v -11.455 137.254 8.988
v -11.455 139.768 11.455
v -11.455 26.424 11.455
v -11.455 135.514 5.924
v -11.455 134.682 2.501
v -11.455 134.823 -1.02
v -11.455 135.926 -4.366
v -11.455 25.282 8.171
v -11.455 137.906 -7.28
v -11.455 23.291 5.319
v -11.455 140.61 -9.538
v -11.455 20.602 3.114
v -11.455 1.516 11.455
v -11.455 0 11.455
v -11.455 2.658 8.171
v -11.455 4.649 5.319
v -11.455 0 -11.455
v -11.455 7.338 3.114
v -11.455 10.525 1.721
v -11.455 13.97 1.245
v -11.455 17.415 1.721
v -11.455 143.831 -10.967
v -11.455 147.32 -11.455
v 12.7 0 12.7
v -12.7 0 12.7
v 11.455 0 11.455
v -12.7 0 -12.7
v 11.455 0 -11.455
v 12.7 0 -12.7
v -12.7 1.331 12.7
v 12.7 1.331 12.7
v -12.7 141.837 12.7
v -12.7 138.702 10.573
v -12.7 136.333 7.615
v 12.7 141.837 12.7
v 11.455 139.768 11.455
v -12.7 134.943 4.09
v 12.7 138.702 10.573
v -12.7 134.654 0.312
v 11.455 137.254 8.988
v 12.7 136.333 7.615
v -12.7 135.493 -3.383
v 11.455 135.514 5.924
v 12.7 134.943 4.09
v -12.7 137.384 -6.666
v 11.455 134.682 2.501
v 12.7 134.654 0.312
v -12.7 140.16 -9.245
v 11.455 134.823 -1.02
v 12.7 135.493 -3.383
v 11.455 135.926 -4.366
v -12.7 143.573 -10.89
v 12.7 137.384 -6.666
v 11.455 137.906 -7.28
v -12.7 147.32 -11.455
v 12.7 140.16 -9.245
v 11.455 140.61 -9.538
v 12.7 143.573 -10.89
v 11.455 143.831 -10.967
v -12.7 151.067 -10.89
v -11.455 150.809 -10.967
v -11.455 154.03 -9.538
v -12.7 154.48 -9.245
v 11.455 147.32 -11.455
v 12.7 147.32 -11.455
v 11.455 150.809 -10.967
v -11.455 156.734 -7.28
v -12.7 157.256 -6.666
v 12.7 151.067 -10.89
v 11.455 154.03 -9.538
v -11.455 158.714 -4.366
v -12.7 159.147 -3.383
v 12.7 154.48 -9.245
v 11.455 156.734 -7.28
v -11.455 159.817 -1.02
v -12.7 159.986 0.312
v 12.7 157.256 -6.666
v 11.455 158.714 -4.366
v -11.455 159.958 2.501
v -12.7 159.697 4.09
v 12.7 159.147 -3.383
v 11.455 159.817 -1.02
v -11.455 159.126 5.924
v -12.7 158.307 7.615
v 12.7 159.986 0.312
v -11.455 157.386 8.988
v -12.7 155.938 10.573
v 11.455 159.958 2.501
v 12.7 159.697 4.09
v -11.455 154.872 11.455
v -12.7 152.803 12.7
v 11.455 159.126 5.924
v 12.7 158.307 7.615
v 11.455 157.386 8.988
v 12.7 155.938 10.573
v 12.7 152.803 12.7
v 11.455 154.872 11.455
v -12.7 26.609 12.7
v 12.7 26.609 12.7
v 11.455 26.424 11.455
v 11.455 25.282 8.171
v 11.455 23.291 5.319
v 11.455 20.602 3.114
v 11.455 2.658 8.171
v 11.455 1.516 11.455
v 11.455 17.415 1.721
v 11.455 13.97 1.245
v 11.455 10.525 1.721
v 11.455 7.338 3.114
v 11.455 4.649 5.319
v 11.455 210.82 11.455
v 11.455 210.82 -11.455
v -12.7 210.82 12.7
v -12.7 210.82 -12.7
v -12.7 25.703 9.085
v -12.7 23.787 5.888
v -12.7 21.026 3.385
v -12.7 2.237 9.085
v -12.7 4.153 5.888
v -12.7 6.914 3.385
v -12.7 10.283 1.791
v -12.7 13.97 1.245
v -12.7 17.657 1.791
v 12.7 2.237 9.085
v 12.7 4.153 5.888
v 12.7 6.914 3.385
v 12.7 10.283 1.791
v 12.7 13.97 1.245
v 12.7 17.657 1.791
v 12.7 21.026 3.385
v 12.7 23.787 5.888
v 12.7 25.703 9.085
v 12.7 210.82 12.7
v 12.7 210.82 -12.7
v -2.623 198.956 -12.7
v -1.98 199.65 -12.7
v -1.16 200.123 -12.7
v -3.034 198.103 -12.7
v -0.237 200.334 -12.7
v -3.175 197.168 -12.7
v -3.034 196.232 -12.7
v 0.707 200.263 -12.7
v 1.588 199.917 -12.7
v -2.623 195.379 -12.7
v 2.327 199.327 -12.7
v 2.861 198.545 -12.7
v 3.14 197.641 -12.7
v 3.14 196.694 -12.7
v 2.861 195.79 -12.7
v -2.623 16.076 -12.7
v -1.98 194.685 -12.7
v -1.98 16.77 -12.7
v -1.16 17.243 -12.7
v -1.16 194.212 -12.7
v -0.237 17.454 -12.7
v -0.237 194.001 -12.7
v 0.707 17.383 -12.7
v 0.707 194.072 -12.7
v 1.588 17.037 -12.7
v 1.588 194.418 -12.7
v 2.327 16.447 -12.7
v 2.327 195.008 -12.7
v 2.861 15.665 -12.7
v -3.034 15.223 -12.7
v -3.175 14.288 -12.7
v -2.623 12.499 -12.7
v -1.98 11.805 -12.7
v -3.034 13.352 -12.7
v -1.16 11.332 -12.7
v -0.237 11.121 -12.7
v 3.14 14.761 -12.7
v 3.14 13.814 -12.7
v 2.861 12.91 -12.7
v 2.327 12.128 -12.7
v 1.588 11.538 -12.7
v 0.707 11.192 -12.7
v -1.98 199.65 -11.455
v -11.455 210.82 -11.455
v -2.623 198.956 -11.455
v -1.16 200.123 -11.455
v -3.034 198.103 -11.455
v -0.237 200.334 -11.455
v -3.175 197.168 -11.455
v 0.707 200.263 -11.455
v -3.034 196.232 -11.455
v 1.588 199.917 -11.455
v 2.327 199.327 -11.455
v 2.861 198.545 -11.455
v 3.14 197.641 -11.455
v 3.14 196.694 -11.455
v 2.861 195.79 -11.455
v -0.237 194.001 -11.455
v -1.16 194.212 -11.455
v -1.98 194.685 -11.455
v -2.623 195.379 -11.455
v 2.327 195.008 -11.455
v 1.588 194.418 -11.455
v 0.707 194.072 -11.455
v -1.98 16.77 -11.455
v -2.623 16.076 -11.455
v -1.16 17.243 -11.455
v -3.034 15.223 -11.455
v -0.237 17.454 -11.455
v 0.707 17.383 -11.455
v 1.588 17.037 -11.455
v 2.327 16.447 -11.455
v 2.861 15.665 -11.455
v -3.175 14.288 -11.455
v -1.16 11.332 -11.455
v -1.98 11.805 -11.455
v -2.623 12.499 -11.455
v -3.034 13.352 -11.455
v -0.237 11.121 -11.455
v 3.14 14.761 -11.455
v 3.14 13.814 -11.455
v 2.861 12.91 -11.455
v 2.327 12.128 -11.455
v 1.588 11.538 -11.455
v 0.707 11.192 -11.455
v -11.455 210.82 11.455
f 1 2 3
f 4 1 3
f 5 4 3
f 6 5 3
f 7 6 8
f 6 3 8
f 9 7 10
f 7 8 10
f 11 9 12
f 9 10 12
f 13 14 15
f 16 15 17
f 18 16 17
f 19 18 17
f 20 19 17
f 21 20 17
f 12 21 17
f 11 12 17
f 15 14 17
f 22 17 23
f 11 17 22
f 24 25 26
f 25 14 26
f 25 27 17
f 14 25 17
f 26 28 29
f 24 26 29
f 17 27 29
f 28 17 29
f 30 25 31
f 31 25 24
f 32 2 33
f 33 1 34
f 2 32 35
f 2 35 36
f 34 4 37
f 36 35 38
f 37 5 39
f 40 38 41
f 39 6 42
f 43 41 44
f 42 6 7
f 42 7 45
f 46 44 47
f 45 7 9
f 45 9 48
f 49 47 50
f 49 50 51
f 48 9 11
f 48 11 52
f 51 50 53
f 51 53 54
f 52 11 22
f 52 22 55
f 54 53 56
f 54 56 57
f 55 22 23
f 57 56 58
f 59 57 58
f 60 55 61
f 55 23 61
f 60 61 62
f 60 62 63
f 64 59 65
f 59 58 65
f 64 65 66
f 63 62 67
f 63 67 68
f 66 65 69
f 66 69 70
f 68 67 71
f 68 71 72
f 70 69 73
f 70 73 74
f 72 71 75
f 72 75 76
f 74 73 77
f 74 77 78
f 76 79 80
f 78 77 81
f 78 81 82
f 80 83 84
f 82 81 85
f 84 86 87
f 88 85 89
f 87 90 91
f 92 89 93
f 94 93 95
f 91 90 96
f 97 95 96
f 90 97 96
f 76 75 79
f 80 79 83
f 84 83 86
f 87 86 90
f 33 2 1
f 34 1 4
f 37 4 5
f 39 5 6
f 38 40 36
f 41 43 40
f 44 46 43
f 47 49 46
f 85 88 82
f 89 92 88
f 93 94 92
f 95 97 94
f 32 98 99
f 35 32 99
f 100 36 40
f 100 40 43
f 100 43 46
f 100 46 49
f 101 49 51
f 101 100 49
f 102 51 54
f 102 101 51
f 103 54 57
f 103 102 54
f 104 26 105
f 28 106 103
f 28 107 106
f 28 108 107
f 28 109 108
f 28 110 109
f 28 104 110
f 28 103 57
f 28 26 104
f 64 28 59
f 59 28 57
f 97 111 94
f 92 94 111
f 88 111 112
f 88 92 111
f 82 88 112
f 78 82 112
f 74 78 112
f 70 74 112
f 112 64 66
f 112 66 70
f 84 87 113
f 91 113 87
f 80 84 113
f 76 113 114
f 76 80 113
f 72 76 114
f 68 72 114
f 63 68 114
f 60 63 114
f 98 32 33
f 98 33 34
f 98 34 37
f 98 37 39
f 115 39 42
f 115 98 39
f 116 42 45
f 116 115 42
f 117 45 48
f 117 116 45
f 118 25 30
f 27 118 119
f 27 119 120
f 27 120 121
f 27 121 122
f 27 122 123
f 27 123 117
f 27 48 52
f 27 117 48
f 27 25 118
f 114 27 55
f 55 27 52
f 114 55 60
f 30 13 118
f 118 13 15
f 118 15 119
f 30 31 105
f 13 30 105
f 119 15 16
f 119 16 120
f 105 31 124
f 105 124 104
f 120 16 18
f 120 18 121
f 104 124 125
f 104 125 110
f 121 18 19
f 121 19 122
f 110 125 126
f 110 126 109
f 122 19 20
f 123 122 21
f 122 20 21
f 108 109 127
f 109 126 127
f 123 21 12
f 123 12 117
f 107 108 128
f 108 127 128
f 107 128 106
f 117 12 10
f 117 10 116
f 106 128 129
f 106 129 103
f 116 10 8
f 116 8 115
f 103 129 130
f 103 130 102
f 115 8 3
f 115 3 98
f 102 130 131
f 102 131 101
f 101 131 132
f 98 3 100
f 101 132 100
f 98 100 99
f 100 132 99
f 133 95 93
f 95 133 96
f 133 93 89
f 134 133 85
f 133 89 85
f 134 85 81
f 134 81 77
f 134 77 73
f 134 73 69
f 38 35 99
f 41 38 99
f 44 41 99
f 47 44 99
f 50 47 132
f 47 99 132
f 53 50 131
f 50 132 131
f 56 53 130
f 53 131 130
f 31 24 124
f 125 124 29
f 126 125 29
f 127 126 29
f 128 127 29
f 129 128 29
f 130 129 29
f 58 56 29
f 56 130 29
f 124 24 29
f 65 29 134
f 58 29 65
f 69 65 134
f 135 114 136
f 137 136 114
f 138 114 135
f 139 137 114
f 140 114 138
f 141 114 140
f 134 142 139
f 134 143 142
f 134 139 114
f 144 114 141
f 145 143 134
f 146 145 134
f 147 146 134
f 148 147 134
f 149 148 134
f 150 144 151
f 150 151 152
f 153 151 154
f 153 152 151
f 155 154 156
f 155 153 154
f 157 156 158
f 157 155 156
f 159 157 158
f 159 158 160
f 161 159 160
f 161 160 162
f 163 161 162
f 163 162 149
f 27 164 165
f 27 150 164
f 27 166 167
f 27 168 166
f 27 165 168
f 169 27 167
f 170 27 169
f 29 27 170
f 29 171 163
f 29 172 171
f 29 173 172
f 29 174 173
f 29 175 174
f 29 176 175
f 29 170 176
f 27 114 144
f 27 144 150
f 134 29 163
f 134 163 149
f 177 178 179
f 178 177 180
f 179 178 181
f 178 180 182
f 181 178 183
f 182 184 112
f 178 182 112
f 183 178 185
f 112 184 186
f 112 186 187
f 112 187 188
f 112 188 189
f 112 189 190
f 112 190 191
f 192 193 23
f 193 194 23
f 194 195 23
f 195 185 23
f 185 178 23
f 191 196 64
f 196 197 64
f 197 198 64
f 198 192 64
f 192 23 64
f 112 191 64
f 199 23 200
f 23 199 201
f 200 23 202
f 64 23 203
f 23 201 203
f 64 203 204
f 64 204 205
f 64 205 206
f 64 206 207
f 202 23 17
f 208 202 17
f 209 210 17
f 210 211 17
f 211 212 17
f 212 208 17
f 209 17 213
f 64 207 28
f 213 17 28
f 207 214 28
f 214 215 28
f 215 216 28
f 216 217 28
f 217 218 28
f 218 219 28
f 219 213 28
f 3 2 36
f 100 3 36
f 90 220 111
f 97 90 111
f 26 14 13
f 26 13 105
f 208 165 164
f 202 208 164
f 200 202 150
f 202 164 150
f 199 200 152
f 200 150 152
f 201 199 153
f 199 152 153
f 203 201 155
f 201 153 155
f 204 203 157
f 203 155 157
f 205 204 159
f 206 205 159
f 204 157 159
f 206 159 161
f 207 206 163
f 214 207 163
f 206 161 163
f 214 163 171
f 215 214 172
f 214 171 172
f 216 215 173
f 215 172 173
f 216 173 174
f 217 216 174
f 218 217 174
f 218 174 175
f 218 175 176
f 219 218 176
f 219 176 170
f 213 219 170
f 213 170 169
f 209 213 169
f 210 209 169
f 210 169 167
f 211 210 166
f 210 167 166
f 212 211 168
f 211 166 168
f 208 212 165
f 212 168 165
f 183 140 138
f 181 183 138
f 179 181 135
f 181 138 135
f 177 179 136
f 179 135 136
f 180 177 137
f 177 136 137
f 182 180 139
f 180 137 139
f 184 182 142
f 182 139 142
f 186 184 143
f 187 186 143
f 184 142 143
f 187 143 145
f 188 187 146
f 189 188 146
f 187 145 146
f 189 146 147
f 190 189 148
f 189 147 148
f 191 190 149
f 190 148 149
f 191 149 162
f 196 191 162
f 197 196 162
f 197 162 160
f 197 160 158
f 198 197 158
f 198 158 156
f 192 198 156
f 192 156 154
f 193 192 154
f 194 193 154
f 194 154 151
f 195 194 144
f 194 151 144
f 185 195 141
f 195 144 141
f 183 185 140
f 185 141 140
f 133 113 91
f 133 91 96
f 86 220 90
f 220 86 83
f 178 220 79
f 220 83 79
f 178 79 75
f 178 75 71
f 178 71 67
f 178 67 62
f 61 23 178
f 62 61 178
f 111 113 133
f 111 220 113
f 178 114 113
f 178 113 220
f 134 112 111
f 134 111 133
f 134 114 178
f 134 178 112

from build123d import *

# Parameters (mm, degrees)
SKETCH1_W           = 25.4
SKETCH1_H           = 25.4
SKETCH1_W_2         = 22.9108
SKETCH1_H_2         = 22.9108
BOSS_EXTRUDE1_DEPTH = 210.82
SKETCH2_R           = 12.7
CUT_EXTRUDE1_DEPTH  = 210.82
SKETCH3_R           = 3.175
CUT_EXTRUDE2_DEPTH  = 1.2446


with BuildPart() as part:
    # Sketch1 → Boss-Extrude1 (new body)
    with BuildSketch(Plane(origin=(0, 0, 0), x_dir=(1, 0, 0), z_dir=(0, 1, 0))):
        Rectangle(SKETCH1_W, SKETCH1_H)
        Rectangle(SKETCH1_W_2, SKETCH1_H_2, mode=Mode.SUBTRACT)
    extrude(amount=BOSS_EXTRUDE1_DEPTH)

    # Sketch2 → Cut-Extrude1 (cut)
    with BuildSketch(Plane(origin=(12.7, 0, 0), x_dir=(0, 0, -1), z_dir=(1, 0, 0))):
        with Locations((-1.2446, 147.32)):
            Circle(SKETCH2_R)
        with Locations((-13.9446, 13.97)):
            Circle(SKETCH2_R)
    extrude(amount=-CUT_EXTRUDE1_DEPTH, mode=Mode.SUBTRACT)

    # Sketch3 → Cut-Extrude2 (cut)
    with BuildSketch(Plane(origin=(0, 0, -12.7), x_dir=(-1, 0, 0), z_dir=(0, 0, -1))):
        with Locations((0, 197.1675)):
            Circle(SKETCH3_R)
        with Locations((0, 14.2875)):
            Circle(SKETCH3_R)
    extrude(amount=-CUT_EXTRUDE2_DEPTH, mode=Mode.SUBTRACT)


solid = part.part
